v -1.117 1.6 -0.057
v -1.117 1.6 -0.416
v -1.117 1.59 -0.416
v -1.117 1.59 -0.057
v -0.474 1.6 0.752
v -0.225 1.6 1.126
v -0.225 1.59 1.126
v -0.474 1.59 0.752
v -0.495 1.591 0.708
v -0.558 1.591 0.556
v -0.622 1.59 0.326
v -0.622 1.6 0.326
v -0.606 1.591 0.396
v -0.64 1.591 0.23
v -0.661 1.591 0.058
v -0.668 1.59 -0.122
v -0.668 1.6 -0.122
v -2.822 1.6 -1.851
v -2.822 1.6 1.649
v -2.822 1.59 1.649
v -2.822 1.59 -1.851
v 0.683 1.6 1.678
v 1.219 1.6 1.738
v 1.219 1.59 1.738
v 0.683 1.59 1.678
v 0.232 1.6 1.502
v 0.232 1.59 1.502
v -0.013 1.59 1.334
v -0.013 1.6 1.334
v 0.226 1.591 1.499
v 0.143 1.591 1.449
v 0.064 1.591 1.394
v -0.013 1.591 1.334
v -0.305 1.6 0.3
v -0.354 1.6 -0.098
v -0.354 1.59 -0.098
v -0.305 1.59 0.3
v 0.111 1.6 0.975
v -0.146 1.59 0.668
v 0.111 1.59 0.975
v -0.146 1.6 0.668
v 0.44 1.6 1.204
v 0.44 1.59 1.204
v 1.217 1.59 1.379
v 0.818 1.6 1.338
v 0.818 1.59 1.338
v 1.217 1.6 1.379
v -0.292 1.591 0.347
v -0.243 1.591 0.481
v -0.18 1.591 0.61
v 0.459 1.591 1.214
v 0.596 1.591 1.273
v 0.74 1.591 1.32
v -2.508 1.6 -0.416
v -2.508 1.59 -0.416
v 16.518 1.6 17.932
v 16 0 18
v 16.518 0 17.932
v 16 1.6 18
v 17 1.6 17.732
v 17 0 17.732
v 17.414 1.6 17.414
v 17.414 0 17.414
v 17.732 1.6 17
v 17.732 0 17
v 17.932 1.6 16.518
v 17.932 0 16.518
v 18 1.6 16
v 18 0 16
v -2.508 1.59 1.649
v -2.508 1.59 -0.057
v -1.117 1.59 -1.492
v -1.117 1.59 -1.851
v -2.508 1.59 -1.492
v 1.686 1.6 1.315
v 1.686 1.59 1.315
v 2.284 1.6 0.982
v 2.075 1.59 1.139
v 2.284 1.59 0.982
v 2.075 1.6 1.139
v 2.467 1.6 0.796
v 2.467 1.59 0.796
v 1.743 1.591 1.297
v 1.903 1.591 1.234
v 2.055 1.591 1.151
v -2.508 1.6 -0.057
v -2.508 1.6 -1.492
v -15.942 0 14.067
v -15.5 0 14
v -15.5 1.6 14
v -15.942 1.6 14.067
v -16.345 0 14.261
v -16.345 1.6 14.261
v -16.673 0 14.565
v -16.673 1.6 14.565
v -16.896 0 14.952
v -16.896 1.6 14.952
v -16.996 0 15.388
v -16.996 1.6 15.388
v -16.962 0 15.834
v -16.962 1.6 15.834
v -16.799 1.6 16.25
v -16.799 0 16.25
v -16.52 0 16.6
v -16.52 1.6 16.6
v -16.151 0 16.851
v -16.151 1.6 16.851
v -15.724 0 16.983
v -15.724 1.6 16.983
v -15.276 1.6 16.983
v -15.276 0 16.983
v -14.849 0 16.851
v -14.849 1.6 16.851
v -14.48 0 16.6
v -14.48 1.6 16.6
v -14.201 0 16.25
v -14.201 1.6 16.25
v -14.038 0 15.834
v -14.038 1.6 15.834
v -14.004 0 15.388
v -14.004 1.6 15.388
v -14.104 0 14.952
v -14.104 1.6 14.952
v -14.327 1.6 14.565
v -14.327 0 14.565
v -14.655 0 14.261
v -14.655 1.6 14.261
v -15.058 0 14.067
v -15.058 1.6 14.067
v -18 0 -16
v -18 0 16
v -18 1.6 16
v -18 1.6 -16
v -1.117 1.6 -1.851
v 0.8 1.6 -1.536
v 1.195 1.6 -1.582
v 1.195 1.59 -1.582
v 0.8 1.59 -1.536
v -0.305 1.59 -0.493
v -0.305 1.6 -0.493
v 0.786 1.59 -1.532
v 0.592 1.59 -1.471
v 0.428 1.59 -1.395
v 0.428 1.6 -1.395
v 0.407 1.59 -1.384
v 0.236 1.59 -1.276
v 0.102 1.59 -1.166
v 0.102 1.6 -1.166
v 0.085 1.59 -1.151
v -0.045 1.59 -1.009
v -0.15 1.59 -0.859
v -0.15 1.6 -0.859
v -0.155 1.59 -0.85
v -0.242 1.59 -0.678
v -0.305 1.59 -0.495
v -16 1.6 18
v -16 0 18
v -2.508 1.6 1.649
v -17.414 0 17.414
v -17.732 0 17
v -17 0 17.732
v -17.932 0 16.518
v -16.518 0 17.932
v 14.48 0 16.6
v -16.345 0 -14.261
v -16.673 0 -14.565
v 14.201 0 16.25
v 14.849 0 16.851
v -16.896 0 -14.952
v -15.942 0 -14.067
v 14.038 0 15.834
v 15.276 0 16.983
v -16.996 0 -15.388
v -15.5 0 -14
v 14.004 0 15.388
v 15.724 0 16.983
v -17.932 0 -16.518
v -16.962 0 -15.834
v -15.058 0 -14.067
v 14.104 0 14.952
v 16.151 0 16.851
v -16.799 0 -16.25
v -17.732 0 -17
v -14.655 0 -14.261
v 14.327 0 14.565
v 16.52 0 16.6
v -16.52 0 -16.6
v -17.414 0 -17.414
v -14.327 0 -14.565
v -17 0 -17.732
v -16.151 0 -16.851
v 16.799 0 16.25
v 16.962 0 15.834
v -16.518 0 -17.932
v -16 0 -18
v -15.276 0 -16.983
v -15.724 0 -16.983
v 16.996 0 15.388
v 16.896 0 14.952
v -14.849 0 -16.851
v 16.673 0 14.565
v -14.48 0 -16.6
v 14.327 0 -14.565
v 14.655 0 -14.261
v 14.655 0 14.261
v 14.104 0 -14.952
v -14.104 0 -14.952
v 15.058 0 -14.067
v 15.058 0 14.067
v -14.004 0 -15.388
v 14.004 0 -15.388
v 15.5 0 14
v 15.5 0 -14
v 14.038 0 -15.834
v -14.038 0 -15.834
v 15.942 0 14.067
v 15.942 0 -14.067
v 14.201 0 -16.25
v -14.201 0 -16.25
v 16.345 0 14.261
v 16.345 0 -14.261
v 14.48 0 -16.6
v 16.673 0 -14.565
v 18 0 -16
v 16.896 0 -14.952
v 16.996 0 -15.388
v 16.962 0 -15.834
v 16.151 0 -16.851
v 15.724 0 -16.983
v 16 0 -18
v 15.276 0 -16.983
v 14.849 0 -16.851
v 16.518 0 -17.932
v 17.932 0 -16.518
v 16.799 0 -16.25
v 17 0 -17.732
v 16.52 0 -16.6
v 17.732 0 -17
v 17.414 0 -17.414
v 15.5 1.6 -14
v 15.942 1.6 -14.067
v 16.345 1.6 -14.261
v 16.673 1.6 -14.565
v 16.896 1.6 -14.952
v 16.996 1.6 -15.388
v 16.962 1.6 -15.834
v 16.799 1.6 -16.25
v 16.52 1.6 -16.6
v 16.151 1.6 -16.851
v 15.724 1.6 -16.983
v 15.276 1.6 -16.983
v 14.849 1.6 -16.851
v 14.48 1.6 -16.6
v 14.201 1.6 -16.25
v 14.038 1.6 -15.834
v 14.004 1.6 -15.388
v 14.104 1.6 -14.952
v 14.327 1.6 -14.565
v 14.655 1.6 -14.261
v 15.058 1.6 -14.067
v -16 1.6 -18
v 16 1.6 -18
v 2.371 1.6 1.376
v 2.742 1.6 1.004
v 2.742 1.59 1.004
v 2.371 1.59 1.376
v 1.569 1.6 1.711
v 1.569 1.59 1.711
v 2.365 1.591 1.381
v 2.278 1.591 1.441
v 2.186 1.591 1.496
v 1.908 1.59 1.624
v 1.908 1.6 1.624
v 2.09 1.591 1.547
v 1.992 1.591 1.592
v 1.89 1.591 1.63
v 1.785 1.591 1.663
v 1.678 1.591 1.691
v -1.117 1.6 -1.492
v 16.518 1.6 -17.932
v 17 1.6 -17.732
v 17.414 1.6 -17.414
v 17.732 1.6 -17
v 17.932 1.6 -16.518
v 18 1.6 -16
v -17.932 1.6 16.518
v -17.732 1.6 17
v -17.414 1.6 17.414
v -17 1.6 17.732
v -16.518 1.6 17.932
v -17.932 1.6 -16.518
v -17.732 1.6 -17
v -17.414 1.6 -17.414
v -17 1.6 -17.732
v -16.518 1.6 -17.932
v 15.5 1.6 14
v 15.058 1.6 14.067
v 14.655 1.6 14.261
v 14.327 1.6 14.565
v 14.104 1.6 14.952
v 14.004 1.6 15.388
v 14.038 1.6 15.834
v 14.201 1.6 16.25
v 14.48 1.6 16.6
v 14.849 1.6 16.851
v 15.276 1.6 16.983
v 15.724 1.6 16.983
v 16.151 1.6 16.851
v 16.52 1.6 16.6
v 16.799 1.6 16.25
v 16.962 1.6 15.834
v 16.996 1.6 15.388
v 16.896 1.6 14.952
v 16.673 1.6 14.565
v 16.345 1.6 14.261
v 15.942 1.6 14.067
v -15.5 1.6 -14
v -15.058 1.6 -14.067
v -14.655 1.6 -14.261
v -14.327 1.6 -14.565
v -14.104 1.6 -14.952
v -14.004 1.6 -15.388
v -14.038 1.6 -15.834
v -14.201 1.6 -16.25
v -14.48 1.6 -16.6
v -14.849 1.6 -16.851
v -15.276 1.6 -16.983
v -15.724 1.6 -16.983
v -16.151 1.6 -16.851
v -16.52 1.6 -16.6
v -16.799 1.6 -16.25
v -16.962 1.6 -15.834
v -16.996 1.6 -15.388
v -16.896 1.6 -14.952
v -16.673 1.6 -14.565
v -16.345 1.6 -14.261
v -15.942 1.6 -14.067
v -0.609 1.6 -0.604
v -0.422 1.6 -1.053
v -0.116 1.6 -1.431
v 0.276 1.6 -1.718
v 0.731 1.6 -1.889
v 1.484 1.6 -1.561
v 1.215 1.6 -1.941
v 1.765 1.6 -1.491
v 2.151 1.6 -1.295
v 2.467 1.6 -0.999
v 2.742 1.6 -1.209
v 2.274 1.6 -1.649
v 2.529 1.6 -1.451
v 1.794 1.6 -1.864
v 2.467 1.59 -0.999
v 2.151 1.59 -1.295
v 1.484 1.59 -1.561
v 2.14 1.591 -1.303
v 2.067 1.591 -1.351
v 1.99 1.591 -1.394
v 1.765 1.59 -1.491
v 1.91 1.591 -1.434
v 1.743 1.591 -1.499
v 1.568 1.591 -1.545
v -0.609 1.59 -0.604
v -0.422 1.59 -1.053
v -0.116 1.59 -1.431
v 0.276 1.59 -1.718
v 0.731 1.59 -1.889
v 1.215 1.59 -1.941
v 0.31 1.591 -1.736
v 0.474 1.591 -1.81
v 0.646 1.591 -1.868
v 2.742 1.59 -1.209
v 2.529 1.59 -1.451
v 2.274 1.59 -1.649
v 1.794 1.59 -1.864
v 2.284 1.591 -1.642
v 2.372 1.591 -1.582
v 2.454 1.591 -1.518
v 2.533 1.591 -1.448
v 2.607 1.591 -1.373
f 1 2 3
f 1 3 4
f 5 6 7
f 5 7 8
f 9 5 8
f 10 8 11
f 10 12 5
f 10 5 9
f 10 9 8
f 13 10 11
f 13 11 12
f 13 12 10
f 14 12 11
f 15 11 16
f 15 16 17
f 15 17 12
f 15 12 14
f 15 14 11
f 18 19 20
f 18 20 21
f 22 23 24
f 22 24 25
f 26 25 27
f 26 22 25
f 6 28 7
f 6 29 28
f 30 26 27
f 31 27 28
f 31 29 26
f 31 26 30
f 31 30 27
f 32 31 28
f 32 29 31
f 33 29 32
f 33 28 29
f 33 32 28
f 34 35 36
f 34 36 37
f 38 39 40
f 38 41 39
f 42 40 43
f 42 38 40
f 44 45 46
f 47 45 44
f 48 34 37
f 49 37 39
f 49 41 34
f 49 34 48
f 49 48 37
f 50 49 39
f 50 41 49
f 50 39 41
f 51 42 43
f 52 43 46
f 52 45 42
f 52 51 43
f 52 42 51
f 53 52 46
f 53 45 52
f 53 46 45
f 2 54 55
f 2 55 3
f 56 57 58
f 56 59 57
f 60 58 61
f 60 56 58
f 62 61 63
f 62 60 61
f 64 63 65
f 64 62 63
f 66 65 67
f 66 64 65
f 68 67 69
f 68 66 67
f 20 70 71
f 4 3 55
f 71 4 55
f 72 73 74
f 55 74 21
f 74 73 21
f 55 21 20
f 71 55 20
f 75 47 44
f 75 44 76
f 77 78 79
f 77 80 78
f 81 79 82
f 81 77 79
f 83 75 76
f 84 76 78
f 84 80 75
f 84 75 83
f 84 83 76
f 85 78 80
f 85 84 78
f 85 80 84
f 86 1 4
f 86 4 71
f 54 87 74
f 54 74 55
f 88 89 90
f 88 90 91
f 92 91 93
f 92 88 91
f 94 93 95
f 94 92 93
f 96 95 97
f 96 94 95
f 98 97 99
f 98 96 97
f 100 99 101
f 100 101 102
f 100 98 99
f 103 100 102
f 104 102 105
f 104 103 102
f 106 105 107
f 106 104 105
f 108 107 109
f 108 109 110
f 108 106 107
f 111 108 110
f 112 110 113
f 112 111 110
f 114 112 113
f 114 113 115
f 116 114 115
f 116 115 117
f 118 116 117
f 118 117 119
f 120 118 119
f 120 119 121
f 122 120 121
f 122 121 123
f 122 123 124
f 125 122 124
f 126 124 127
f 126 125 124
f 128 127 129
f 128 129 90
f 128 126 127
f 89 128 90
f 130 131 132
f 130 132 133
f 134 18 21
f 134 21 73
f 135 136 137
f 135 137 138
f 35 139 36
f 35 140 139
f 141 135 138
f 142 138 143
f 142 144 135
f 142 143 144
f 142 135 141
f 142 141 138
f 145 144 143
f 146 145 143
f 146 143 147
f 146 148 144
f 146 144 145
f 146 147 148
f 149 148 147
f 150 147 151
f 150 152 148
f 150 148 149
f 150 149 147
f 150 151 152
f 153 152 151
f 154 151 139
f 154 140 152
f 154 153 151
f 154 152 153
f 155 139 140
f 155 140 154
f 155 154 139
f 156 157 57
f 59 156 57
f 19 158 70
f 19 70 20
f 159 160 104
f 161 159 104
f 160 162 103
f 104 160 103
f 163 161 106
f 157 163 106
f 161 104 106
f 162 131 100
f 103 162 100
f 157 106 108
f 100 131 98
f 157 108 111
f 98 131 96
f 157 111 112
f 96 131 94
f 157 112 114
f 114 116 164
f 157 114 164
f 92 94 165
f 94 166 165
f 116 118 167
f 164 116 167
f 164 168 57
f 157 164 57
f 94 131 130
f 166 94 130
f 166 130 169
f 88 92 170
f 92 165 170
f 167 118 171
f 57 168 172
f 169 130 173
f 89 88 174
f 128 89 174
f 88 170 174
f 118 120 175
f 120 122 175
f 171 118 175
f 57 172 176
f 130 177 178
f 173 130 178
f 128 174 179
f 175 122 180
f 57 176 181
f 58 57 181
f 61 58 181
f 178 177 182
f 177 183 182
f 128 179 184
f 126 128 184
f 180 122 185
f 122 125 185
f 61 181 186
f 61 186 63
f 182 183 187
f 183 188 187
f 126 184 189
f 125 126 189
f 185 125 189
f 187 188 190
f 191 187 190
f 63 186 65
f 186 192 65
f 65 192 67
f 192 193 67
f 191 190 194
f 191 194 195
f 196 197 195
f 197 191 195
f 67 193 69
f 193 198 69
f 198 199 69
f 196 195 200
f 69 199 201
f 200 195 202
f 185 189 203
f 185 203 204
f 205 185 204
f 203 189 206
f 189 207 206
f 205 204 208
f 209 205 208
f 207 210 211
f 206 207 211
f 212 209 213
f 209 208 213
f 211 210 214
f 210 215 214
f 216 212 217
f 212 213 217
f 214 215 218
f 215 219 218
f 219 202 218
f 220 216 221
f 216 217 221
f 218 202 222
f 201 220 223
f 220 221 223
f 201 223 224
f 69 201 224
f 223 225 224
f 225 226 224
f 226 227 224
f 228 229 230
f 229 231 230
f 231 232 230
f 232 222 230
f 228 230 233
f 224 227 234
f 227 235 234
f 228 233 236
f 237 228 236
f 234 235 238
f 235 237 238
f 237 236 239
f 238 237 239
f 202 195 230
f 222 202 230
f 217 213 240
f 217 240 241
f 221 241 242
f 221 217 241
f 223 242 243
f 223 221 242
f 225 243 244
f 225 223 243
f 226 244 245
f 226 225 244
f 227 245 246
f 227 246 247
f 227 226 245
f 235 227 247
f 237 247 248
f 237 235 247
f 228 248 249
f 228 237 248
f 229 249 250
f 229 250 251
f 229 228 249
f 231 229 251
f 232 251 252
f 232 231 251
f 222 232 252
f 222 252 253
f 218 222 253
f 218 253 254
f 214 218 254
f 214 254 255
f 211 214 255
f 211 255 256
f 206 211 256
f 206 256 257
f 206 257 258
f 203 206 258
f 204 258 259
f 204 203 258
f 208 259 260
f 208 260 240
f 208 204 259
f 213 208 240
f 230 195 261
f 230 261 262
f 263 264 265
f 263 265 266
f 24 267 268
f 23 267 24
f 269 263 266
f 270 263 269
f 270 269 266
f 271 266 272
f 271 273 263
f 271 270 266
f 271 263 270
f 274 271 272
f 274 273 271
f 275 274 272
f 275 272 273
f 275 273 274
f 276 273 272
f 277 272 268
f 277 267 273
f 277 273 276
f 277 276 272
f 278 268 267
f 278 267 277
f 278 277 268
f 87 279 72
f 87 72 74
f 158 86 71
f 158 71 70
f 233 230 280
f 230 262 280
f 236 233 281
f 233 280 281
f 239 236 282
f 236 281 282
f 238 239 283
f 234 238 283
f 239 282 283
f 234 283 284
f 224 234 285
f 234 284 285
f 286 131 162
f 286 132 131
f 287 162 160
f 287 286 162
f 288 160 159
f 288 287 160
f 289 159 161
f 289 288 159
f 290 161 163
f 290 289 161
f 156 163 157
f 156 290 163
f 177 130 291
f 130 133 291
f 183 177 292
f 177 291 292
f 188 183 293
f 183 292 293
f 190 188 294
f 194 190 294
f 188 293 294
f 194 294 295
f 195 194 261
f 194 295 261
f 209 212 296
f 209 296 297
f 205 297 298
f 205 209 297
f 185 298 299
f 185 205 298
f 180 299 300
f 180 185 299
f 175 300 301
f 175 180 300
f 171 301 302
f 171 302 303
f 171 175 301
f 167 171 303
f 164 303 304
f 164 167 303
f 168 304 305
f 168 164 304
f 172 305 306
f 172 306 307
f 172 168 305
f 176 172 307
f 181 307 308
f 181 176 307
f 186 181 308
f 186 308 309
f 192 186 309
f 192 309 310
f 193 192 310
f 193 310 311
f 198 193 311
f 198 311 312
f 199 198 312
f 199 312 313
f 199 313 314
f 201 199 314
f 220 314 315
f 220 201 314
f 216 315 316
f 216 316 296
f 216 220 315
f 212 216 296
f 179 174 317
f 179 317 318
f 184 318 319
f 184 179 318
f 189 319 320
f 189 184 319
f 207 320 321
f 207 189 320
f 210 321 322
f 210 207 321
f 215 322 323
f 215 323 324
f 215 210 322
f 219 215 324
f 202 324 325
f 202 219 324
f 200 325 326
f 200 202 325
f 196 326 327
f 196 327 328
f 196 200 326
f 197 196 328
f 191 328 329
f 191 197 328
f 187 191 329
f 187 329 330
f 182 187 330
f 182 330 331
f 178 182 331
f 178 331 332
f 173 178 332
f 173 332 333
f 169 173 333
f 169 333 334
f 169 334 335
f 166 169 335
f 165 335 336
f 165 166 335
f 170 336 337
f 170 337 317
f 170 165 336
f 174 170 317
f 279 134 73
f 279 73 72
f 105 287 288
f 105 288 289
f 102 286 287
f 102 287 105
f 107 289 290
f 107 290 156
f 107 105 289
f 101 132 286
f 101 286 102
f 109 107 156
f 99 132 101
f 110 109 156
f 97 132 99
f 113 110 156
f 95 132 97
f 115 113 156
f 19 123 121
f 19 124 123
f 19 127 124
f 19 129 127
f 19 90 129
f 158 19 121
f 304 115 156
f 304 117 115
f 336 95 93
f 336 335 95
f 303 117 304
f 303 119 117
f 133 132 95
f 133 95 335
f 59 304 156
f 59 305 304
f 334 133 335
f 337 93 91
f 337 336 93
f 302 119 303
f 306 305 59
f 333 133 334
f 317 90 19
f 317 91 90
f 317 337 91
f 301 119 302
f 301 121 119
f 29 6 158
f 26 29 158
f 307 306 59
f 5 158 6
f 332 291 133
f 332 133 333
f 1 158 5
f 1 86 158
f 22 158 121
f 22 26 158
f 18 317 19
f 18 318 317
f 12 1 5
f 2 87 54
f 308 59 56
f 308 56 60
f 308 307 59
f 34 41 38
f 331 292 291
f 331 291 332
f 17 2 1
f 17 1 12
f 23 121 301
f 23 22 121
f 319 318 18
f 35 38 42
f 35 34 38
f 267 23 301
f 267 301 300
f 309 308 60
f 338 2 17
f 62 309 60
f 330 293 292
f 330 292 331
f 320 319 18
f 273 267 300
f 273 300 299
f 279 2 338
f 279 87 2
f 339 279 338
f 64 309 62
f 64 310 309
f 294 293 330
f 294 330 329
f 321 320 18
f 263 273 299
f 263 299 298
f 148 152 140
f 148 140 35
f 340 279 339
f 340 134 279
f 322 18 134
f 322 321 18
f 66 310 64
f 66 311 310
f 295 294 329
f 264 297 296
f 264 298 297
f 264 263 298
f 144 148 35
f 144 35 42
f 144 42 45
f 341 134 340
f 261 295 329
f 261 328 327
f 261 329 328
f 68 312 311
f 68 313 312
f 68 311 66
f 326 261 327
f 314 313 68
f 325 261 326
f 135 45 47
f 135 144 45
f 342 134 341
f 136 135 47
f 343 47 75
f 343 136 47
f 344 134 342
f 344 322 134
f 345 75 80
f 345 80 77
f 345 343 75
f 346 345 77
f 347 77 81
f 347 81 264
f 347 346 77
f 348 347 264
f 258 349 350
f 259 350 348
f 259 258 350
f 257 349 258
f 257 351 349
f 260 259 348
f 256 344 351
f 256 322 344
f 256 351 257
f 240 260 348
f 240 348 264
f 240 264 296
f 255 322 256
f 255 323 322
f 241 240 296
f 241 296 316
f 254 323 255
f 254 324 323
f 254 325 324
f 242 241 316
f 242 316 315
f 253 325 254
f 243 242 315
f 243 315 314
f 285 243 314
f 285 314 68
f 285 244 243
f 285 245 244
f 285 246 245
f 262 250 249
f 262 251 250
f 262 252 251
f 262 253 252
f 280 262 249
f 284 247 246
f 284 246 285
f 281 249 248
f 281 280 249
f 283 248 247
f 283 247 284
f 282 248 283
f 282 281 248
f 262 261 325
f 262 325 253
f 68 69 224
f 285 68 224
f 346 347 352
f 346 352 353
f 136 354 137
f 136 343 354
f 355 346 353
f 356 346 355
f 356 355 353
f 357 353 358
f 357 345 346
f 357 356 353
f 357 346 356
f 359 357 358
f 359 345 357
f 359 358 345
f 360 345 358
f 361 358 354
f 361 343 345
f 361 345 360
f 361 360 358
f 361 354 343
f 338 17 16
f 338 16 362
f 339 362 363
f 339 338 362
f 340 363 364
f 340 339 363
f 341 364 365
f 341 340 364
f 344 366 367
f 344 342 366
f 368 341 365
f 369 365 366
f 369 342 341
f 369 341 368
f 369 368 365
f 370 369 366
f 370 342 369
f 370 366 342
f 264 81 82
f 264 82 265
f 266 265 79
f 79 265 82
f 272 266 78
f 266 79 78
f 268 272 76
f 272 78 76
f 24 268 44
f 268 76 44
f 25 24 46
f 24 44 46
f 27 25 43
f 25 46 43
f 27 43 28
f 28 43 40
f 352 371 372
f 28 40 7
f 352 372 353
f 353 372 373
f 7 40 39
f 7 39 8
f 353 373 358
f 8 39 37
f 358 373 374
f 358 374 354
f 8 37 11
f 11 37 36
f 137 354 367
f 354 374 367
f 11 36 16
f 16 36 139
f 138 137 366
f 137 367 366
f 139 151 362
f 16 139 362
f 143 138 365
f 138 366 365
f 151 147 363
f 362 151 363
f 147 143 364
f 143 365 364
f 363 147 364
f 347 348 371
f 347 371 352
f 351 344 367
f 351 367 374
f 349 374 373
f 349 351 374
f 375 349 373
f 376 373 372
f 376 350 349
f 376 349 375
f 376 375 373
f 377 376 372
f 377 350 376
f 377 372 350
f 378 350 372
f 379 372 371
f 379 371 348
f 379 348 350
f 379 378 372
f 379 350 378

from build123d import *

# Parameters (mm, degrees)
SKETCH1_W           = 36
SKETCH1_H           = 36
SKETCH1_R           = 1.5
BOSS_EXTRUDE1_DEPTH = 1.6
FILLET1_R           = 2
CUT_EXTRUDE1_DEPTH  = 0.01


with BuildPart() as part:
    # Sketch1 → Boss-Extrude1 (new body)
    with BuildSketch(Plane(origin=(0, 0, 0), x_dir=(1, 0, 0), z_dir=(0, 1, 0))):
        Rectangle(SKETCH1_W, SKETCH1_H)
        with Locations(Location((-15.5, 15.5, 0), (0, 0, 270))):
            Circle(SKETCH1_R, mode=Mode.SUBTRACT)
        with Locations(Location((15.5, 15.5, 0), (0, 0, 270))):
            Circle(SKETCH1_R, mode=Mode.SUBTRACT)
        with Locations(Location((-15.5, -15.5, 0), (0, 0, 90))):
            Circle(SKETCH1_R, mode=Mode.SUBTRACT)
        with Locations(Location((15.5, -15.5, 0), (0, 0, 90))):
            Circle(SKETCH1_R, mode=Mode.SUBTRACT)
    extrude(amount=BOSS_EXTRUDE1_DEPTH)

    # Fillet1
    fillet1_edges = [part.edges().sort_by_distance(p)[0] for p in [
        (18, 0.8, 18),
        (-18, 0.8, 18),
        (-18, 0.8, -18),
        (18, 0.8, -18),
    ]]
    fillet(fillet1_edges, radius=FILLET1_R)

    # Sketch2 → Cut-Extrude1 (cut)
    with BuildSketch(Plane(origin=(0, 1.6, 0), x_dir=(1, 0, 0), z_dir=(0, 1, 0))):
        Polygon((-2.822286409, 1.851413804), (-1.117158204, 1.851413804), (-1.117158204, 1.492439445), (-2.508183845, 1.492439445), (-2.508183845, 0.415516368), (-1.117158204, 0.415516368), (-1.117158204, 0.056542009), (-2.508183845, 0.056542009), (-2.508183845, -1.648586196), (-2.822286409, -1.648586196), align=None)
        with BuildLine():
            Line((2.741816155, 1.209186239), (2.466976411, 0.998849701))
            add(Edge.make_bspline(
                [(2.466976411, 0.998849701), (2.447370523, 1.022215671), (2.408423076, 1.068632587), (2.345763874, 1.133812131), (2.280462231, 1.194877392), (2.212543109, 1.252119272), (2.14078399, 1.303536038), (2.066923191, 1.351807141), (1.989725146, 1.395074879), (1.882973411, 1.447537865), (1.743325563, 1.50228402), (1.567530724, 1.548187251), (1.384019626, 1.577408427), (1.258822026, 1.580573268), (1.195141475, 1.582183034)],
                knots=[0, 0, 0, 0, 0.757959112, 1.505699292, 2.245454638, 2.979532153, 3.711538275, 4.438200793, 5.171680507, 5.909471876, 7.393775596, 8.890124382, 10.418191784, 12, 12, 12, 12], degree=3))
            add(Edge.make_bspline(
                [(1.195141475, 1.582183034), (1.160058176, 1.581779072), (1.090217183, 1.580974896), (0.98656871, 1.570365771), (0.884855659, 1.555454561), (0.785144193, 1.533329238), (0.687561234, 1.505356618), (0.591468832, 1.471931205), (0.498258232, 1.430576365), (0.406639994, 1.384868105), (0.318860783, 1.33324066), (0.235805735, 1.276927308), (0.157777767, 1.216558212), (0.084715155, 1.151907105), (0.016543207, 1.083265145), (-0.046244104, 1.009900803), (-0.103429514, 0.93204863), (-0.156146539, 0.850735222), (-0.203359273, 0.76619743), (-0.242889152, 0.67812236), (-0.277894274, 0.588018257), (-0.305593517, 0.494867096), (-0.327518034, 0.39932433), (-0.342645697, 0.301133542), (-0.353134168, 0.200499863), (-0.353934345, 0.13229055), (-0.354337691, 0.097908195)],
                knots=[0, 0, 0, 0, 1.054917814, 2.100044995, 3.131103042, 4.146048494, 5.169673617, 6.183595914, 7.203665975, 8.234915748, 9.262203917, 10.264457458, 11.251630812, 12.227803204, 13.197192746, 14.159520551, 15.12972552, 16.100847026, 17.073214652, 18.039054194, 19.002613845, 19.979014051, 20.95965708, 21.949030935, 22.966165397, 24, 24, 24, 24], degree=3))
            add(Edge.make_bspline(
                [(-0.354337691, 0.097908195), (-0.353075872, 0.046176875), (-0.350598458, -0.05539071), (-0.328550124, -0.204161321), (-0.295045033, -0.346681994), (-0.244829456, -0.482061837), (-0.182910405, -0.611970195), (-0.104669794, -0.734209048), (-0.014053256, -0.850625613), (0.090221163, -0.958468561), (0.204626979, -1.056982286), (0.327374891, -1.143732867), (0.458159179, -1.21604775), (0.595535809, -1.276223696), (0.740561923, -1.322480424), (0.892976725, -1.355044547), (1.05244872, -1.376286728), (1.16141812, -1.378320416), (1.216876251, -1.379355427)],
                knots=[0, 0, 0, 0, 1.029171465, 2.020641659, 2.987623507, 3.938342917, 4.889210282, 5.84687017, 6.821220943, 7.821438502, 8.827599549, 9.822697543, 10.807740252, 11.797342354, 12.80366471, 13.83203677, 14.896651826, 16, 16, 16, 16], degree=3))
            add(Edge.make_bspline(
                [(1.216876251, -1.379355427), (1.27797894, -1.377666647), (1.398243649, -1.374342725), (1.574611675, -1.346183476), (1.743447441, -1.300525558), (1.904760027, -1.236627636), (2.058094674, -1.153562348), (2.203691334, -1.05286447), (2.341672904, -0.933576138), (2.424644187, -0.842493009), (2.466976411, -0.796022094)],
                knots=[0, 0, 0, 0, 1.028121516, 2.023589091, 2.998037872, 3.967518031, 4.937445131, 5.927275754, 6.942489185, 8, 8, 8, 8], degree=3))
            Line((2.466976411, -0.796022094), (2.741816155, -1.004255267))
            add(Edge.make_bspline(
                [(2.741816155, -1.004255267), (2.719698045, -1.032793719), (2.67556777, -1.089733925), (2.604109753, -1.170005635), (2.528832455, -1.24550967), (2.449176745, -1.315637292), (2.366058954, -1.381791757), (2.277986641, -1.442093588), (2.186117609, -1.497384473), (2.09076313, -1.548011397), (1.992024517, -1.592928644), (1.890020082, -1.631382412), (1.785189507, -1.664507302), (1.677527998, -1.691759238), (1.566812241, -1.713030322), (1.453441767, -1.727249997), (1.337171892, -1.736991911), (1.258730471, -1.737879827), (1.218979616, -1.738329786)],
                knots=[0, 0, 0, 0, 0.986787822, 1.968848986, 2.935600012, 3.899624008, 4.868462664, 5.837806735, 6.815139263, 7.798259679, 8.787526145, 9.778297419, 10.776456485, 11.791383307, 12.812564526, 13.85620153, 14.913611965, 16, 16, 16, 16], degree=3))
            add(Edge.make_bspline(
                [(1.218979616, -1.738329786), (1.181335949, -1.738067794), (1.106900259, -1.737549736), (0.997001508, -1.729157568), (0.890011927, -1.717707831), (0.786237301, -1.7004677), (0.685111326, -1.68012336), (0.587550741, -1.652852104), (0.492595531, -1.622302937), (0.40062719, -1.58639795), (0.311567491, -1.545881768), (0.225703679, -1.500090209), (0.143075247, -1.449408344), (0.062869826, -1.394953334), (-0.013727758, -1.334976032), (-0.087381283, -1.270309397), (-0.158503759, -1.201171387), (-0.202506444, -1.151316533), (-0.224630159, -1.126250459)],
                knots=[0, 0, 0, 0, 1.114604814, 2.203992996, 3.262667896, 4.300477797, 5.318619304, 6.316056647, 7.298880507, 8.271930387, 9.238335007, 10.195173496, 11.151986948, 12.108099108, 13.064862484, 14.031167946, 15.010108607, 16, 16, 16, 16], degree=3))
            add(Edge.make_bspline(
                [(-0.224630159, -1.126250459), (-0.260065803, -1.08270927), (-0.33050928, -0.99615256), (-0.420634963, -0.855866579), (-0.497782518, -0.70939837), (-0.560158439, -0.555978441), (-0.608921172, -0.395951054), (-0.642702367, -0.229235539), (-0.664653972, -0.055987597), (-0.667164261, 0.061849192), (-0.668440255, 0.121746336)],
                knots=[0, 0, 0, 0, 0.994628077, 1.977248131, 2.950237994, 3.925870899, 4.908910175, 5.911660606, 6.938484602, 8, 8, 8, 8], degree=3))
            add(Edge.make_bspline(
                [(-0.668440255, 0.121746336), (-0.666885062, 0.184701789), (-0.663825316, 0.308562714), (-0.63782952, 0.490336667), (-0.596010724, 0.664488066), (-0.536613835, 0.83069181), (-0.461308484, 0.989822091), (-0.36828187, 1.140663296), (-0.258614728, 1.284180095), (-0.13316716, 1.418194847), (0.004400175, 1.540734199), (0.151718989, 1.648540403), (0.308500936, 1.738257919), (0.473018788, 1.813254081), (0.646504469, 1.870898544), (0.828587838, 1.911251731), (1.018926753, 1.936368847), (1.148789179, 1.939544055), (1.214772886, 1.941157393)],
                knots=[0, 0, 0, 0, 1.032925535, 2.032216505, 3.007276963, 3.968222605, 4.92396291, 5.891752235, 6.871517503, 7.883894988, 8.900124299, 9.891468569, 10.874487609, 11.85992873, 12.854644235, 13.869047385, 14.917252991, 16, 16, 16, 16], degree=3))
            add(Edge.make_bspline(
                [(1.214772886, 1.941157393), (1.254987358, 1.940675255), (1.334587855, 1.939720911), (1.452340507, 1.930414769), (1.566982834, 1.914901163), (1.678593816, 1.893785093), (1.787716432, 1.867577772), (1.893516673, 1.833437473), (1.99661536, 1.794400942), (2.096362268, 1.749442476), (2.192278819, 1.698975735), (2.284335137, 1.643560111), (2.371799996, 1.583264305), (2.455288844, 1.51860113), (2.533405055, 1.448202571), (2.608366534, 1.374004975), (2.677627612, 1.293871151), (2.720380807, 1.237466217), (2.741816155, 1.209186239)],
                knots=[0, 0, 0, 0, 1.096760587, 2.17092713, 3.219439832, 4.250915756, 5.268269357, 6.278326846, 7.281116186, 8.274029601, 9.260640565, 10.235837813, 11.203064059, 12.156899882, 13.114053108, 14.069676657, 15.032185724, 16, 16, 16, 16], degree=3))
        make_face()
    extrude(amount=-CUT_EXTRUDE1_DEPTH, mode=Mode.SUBTRACT)


solid = part.part
